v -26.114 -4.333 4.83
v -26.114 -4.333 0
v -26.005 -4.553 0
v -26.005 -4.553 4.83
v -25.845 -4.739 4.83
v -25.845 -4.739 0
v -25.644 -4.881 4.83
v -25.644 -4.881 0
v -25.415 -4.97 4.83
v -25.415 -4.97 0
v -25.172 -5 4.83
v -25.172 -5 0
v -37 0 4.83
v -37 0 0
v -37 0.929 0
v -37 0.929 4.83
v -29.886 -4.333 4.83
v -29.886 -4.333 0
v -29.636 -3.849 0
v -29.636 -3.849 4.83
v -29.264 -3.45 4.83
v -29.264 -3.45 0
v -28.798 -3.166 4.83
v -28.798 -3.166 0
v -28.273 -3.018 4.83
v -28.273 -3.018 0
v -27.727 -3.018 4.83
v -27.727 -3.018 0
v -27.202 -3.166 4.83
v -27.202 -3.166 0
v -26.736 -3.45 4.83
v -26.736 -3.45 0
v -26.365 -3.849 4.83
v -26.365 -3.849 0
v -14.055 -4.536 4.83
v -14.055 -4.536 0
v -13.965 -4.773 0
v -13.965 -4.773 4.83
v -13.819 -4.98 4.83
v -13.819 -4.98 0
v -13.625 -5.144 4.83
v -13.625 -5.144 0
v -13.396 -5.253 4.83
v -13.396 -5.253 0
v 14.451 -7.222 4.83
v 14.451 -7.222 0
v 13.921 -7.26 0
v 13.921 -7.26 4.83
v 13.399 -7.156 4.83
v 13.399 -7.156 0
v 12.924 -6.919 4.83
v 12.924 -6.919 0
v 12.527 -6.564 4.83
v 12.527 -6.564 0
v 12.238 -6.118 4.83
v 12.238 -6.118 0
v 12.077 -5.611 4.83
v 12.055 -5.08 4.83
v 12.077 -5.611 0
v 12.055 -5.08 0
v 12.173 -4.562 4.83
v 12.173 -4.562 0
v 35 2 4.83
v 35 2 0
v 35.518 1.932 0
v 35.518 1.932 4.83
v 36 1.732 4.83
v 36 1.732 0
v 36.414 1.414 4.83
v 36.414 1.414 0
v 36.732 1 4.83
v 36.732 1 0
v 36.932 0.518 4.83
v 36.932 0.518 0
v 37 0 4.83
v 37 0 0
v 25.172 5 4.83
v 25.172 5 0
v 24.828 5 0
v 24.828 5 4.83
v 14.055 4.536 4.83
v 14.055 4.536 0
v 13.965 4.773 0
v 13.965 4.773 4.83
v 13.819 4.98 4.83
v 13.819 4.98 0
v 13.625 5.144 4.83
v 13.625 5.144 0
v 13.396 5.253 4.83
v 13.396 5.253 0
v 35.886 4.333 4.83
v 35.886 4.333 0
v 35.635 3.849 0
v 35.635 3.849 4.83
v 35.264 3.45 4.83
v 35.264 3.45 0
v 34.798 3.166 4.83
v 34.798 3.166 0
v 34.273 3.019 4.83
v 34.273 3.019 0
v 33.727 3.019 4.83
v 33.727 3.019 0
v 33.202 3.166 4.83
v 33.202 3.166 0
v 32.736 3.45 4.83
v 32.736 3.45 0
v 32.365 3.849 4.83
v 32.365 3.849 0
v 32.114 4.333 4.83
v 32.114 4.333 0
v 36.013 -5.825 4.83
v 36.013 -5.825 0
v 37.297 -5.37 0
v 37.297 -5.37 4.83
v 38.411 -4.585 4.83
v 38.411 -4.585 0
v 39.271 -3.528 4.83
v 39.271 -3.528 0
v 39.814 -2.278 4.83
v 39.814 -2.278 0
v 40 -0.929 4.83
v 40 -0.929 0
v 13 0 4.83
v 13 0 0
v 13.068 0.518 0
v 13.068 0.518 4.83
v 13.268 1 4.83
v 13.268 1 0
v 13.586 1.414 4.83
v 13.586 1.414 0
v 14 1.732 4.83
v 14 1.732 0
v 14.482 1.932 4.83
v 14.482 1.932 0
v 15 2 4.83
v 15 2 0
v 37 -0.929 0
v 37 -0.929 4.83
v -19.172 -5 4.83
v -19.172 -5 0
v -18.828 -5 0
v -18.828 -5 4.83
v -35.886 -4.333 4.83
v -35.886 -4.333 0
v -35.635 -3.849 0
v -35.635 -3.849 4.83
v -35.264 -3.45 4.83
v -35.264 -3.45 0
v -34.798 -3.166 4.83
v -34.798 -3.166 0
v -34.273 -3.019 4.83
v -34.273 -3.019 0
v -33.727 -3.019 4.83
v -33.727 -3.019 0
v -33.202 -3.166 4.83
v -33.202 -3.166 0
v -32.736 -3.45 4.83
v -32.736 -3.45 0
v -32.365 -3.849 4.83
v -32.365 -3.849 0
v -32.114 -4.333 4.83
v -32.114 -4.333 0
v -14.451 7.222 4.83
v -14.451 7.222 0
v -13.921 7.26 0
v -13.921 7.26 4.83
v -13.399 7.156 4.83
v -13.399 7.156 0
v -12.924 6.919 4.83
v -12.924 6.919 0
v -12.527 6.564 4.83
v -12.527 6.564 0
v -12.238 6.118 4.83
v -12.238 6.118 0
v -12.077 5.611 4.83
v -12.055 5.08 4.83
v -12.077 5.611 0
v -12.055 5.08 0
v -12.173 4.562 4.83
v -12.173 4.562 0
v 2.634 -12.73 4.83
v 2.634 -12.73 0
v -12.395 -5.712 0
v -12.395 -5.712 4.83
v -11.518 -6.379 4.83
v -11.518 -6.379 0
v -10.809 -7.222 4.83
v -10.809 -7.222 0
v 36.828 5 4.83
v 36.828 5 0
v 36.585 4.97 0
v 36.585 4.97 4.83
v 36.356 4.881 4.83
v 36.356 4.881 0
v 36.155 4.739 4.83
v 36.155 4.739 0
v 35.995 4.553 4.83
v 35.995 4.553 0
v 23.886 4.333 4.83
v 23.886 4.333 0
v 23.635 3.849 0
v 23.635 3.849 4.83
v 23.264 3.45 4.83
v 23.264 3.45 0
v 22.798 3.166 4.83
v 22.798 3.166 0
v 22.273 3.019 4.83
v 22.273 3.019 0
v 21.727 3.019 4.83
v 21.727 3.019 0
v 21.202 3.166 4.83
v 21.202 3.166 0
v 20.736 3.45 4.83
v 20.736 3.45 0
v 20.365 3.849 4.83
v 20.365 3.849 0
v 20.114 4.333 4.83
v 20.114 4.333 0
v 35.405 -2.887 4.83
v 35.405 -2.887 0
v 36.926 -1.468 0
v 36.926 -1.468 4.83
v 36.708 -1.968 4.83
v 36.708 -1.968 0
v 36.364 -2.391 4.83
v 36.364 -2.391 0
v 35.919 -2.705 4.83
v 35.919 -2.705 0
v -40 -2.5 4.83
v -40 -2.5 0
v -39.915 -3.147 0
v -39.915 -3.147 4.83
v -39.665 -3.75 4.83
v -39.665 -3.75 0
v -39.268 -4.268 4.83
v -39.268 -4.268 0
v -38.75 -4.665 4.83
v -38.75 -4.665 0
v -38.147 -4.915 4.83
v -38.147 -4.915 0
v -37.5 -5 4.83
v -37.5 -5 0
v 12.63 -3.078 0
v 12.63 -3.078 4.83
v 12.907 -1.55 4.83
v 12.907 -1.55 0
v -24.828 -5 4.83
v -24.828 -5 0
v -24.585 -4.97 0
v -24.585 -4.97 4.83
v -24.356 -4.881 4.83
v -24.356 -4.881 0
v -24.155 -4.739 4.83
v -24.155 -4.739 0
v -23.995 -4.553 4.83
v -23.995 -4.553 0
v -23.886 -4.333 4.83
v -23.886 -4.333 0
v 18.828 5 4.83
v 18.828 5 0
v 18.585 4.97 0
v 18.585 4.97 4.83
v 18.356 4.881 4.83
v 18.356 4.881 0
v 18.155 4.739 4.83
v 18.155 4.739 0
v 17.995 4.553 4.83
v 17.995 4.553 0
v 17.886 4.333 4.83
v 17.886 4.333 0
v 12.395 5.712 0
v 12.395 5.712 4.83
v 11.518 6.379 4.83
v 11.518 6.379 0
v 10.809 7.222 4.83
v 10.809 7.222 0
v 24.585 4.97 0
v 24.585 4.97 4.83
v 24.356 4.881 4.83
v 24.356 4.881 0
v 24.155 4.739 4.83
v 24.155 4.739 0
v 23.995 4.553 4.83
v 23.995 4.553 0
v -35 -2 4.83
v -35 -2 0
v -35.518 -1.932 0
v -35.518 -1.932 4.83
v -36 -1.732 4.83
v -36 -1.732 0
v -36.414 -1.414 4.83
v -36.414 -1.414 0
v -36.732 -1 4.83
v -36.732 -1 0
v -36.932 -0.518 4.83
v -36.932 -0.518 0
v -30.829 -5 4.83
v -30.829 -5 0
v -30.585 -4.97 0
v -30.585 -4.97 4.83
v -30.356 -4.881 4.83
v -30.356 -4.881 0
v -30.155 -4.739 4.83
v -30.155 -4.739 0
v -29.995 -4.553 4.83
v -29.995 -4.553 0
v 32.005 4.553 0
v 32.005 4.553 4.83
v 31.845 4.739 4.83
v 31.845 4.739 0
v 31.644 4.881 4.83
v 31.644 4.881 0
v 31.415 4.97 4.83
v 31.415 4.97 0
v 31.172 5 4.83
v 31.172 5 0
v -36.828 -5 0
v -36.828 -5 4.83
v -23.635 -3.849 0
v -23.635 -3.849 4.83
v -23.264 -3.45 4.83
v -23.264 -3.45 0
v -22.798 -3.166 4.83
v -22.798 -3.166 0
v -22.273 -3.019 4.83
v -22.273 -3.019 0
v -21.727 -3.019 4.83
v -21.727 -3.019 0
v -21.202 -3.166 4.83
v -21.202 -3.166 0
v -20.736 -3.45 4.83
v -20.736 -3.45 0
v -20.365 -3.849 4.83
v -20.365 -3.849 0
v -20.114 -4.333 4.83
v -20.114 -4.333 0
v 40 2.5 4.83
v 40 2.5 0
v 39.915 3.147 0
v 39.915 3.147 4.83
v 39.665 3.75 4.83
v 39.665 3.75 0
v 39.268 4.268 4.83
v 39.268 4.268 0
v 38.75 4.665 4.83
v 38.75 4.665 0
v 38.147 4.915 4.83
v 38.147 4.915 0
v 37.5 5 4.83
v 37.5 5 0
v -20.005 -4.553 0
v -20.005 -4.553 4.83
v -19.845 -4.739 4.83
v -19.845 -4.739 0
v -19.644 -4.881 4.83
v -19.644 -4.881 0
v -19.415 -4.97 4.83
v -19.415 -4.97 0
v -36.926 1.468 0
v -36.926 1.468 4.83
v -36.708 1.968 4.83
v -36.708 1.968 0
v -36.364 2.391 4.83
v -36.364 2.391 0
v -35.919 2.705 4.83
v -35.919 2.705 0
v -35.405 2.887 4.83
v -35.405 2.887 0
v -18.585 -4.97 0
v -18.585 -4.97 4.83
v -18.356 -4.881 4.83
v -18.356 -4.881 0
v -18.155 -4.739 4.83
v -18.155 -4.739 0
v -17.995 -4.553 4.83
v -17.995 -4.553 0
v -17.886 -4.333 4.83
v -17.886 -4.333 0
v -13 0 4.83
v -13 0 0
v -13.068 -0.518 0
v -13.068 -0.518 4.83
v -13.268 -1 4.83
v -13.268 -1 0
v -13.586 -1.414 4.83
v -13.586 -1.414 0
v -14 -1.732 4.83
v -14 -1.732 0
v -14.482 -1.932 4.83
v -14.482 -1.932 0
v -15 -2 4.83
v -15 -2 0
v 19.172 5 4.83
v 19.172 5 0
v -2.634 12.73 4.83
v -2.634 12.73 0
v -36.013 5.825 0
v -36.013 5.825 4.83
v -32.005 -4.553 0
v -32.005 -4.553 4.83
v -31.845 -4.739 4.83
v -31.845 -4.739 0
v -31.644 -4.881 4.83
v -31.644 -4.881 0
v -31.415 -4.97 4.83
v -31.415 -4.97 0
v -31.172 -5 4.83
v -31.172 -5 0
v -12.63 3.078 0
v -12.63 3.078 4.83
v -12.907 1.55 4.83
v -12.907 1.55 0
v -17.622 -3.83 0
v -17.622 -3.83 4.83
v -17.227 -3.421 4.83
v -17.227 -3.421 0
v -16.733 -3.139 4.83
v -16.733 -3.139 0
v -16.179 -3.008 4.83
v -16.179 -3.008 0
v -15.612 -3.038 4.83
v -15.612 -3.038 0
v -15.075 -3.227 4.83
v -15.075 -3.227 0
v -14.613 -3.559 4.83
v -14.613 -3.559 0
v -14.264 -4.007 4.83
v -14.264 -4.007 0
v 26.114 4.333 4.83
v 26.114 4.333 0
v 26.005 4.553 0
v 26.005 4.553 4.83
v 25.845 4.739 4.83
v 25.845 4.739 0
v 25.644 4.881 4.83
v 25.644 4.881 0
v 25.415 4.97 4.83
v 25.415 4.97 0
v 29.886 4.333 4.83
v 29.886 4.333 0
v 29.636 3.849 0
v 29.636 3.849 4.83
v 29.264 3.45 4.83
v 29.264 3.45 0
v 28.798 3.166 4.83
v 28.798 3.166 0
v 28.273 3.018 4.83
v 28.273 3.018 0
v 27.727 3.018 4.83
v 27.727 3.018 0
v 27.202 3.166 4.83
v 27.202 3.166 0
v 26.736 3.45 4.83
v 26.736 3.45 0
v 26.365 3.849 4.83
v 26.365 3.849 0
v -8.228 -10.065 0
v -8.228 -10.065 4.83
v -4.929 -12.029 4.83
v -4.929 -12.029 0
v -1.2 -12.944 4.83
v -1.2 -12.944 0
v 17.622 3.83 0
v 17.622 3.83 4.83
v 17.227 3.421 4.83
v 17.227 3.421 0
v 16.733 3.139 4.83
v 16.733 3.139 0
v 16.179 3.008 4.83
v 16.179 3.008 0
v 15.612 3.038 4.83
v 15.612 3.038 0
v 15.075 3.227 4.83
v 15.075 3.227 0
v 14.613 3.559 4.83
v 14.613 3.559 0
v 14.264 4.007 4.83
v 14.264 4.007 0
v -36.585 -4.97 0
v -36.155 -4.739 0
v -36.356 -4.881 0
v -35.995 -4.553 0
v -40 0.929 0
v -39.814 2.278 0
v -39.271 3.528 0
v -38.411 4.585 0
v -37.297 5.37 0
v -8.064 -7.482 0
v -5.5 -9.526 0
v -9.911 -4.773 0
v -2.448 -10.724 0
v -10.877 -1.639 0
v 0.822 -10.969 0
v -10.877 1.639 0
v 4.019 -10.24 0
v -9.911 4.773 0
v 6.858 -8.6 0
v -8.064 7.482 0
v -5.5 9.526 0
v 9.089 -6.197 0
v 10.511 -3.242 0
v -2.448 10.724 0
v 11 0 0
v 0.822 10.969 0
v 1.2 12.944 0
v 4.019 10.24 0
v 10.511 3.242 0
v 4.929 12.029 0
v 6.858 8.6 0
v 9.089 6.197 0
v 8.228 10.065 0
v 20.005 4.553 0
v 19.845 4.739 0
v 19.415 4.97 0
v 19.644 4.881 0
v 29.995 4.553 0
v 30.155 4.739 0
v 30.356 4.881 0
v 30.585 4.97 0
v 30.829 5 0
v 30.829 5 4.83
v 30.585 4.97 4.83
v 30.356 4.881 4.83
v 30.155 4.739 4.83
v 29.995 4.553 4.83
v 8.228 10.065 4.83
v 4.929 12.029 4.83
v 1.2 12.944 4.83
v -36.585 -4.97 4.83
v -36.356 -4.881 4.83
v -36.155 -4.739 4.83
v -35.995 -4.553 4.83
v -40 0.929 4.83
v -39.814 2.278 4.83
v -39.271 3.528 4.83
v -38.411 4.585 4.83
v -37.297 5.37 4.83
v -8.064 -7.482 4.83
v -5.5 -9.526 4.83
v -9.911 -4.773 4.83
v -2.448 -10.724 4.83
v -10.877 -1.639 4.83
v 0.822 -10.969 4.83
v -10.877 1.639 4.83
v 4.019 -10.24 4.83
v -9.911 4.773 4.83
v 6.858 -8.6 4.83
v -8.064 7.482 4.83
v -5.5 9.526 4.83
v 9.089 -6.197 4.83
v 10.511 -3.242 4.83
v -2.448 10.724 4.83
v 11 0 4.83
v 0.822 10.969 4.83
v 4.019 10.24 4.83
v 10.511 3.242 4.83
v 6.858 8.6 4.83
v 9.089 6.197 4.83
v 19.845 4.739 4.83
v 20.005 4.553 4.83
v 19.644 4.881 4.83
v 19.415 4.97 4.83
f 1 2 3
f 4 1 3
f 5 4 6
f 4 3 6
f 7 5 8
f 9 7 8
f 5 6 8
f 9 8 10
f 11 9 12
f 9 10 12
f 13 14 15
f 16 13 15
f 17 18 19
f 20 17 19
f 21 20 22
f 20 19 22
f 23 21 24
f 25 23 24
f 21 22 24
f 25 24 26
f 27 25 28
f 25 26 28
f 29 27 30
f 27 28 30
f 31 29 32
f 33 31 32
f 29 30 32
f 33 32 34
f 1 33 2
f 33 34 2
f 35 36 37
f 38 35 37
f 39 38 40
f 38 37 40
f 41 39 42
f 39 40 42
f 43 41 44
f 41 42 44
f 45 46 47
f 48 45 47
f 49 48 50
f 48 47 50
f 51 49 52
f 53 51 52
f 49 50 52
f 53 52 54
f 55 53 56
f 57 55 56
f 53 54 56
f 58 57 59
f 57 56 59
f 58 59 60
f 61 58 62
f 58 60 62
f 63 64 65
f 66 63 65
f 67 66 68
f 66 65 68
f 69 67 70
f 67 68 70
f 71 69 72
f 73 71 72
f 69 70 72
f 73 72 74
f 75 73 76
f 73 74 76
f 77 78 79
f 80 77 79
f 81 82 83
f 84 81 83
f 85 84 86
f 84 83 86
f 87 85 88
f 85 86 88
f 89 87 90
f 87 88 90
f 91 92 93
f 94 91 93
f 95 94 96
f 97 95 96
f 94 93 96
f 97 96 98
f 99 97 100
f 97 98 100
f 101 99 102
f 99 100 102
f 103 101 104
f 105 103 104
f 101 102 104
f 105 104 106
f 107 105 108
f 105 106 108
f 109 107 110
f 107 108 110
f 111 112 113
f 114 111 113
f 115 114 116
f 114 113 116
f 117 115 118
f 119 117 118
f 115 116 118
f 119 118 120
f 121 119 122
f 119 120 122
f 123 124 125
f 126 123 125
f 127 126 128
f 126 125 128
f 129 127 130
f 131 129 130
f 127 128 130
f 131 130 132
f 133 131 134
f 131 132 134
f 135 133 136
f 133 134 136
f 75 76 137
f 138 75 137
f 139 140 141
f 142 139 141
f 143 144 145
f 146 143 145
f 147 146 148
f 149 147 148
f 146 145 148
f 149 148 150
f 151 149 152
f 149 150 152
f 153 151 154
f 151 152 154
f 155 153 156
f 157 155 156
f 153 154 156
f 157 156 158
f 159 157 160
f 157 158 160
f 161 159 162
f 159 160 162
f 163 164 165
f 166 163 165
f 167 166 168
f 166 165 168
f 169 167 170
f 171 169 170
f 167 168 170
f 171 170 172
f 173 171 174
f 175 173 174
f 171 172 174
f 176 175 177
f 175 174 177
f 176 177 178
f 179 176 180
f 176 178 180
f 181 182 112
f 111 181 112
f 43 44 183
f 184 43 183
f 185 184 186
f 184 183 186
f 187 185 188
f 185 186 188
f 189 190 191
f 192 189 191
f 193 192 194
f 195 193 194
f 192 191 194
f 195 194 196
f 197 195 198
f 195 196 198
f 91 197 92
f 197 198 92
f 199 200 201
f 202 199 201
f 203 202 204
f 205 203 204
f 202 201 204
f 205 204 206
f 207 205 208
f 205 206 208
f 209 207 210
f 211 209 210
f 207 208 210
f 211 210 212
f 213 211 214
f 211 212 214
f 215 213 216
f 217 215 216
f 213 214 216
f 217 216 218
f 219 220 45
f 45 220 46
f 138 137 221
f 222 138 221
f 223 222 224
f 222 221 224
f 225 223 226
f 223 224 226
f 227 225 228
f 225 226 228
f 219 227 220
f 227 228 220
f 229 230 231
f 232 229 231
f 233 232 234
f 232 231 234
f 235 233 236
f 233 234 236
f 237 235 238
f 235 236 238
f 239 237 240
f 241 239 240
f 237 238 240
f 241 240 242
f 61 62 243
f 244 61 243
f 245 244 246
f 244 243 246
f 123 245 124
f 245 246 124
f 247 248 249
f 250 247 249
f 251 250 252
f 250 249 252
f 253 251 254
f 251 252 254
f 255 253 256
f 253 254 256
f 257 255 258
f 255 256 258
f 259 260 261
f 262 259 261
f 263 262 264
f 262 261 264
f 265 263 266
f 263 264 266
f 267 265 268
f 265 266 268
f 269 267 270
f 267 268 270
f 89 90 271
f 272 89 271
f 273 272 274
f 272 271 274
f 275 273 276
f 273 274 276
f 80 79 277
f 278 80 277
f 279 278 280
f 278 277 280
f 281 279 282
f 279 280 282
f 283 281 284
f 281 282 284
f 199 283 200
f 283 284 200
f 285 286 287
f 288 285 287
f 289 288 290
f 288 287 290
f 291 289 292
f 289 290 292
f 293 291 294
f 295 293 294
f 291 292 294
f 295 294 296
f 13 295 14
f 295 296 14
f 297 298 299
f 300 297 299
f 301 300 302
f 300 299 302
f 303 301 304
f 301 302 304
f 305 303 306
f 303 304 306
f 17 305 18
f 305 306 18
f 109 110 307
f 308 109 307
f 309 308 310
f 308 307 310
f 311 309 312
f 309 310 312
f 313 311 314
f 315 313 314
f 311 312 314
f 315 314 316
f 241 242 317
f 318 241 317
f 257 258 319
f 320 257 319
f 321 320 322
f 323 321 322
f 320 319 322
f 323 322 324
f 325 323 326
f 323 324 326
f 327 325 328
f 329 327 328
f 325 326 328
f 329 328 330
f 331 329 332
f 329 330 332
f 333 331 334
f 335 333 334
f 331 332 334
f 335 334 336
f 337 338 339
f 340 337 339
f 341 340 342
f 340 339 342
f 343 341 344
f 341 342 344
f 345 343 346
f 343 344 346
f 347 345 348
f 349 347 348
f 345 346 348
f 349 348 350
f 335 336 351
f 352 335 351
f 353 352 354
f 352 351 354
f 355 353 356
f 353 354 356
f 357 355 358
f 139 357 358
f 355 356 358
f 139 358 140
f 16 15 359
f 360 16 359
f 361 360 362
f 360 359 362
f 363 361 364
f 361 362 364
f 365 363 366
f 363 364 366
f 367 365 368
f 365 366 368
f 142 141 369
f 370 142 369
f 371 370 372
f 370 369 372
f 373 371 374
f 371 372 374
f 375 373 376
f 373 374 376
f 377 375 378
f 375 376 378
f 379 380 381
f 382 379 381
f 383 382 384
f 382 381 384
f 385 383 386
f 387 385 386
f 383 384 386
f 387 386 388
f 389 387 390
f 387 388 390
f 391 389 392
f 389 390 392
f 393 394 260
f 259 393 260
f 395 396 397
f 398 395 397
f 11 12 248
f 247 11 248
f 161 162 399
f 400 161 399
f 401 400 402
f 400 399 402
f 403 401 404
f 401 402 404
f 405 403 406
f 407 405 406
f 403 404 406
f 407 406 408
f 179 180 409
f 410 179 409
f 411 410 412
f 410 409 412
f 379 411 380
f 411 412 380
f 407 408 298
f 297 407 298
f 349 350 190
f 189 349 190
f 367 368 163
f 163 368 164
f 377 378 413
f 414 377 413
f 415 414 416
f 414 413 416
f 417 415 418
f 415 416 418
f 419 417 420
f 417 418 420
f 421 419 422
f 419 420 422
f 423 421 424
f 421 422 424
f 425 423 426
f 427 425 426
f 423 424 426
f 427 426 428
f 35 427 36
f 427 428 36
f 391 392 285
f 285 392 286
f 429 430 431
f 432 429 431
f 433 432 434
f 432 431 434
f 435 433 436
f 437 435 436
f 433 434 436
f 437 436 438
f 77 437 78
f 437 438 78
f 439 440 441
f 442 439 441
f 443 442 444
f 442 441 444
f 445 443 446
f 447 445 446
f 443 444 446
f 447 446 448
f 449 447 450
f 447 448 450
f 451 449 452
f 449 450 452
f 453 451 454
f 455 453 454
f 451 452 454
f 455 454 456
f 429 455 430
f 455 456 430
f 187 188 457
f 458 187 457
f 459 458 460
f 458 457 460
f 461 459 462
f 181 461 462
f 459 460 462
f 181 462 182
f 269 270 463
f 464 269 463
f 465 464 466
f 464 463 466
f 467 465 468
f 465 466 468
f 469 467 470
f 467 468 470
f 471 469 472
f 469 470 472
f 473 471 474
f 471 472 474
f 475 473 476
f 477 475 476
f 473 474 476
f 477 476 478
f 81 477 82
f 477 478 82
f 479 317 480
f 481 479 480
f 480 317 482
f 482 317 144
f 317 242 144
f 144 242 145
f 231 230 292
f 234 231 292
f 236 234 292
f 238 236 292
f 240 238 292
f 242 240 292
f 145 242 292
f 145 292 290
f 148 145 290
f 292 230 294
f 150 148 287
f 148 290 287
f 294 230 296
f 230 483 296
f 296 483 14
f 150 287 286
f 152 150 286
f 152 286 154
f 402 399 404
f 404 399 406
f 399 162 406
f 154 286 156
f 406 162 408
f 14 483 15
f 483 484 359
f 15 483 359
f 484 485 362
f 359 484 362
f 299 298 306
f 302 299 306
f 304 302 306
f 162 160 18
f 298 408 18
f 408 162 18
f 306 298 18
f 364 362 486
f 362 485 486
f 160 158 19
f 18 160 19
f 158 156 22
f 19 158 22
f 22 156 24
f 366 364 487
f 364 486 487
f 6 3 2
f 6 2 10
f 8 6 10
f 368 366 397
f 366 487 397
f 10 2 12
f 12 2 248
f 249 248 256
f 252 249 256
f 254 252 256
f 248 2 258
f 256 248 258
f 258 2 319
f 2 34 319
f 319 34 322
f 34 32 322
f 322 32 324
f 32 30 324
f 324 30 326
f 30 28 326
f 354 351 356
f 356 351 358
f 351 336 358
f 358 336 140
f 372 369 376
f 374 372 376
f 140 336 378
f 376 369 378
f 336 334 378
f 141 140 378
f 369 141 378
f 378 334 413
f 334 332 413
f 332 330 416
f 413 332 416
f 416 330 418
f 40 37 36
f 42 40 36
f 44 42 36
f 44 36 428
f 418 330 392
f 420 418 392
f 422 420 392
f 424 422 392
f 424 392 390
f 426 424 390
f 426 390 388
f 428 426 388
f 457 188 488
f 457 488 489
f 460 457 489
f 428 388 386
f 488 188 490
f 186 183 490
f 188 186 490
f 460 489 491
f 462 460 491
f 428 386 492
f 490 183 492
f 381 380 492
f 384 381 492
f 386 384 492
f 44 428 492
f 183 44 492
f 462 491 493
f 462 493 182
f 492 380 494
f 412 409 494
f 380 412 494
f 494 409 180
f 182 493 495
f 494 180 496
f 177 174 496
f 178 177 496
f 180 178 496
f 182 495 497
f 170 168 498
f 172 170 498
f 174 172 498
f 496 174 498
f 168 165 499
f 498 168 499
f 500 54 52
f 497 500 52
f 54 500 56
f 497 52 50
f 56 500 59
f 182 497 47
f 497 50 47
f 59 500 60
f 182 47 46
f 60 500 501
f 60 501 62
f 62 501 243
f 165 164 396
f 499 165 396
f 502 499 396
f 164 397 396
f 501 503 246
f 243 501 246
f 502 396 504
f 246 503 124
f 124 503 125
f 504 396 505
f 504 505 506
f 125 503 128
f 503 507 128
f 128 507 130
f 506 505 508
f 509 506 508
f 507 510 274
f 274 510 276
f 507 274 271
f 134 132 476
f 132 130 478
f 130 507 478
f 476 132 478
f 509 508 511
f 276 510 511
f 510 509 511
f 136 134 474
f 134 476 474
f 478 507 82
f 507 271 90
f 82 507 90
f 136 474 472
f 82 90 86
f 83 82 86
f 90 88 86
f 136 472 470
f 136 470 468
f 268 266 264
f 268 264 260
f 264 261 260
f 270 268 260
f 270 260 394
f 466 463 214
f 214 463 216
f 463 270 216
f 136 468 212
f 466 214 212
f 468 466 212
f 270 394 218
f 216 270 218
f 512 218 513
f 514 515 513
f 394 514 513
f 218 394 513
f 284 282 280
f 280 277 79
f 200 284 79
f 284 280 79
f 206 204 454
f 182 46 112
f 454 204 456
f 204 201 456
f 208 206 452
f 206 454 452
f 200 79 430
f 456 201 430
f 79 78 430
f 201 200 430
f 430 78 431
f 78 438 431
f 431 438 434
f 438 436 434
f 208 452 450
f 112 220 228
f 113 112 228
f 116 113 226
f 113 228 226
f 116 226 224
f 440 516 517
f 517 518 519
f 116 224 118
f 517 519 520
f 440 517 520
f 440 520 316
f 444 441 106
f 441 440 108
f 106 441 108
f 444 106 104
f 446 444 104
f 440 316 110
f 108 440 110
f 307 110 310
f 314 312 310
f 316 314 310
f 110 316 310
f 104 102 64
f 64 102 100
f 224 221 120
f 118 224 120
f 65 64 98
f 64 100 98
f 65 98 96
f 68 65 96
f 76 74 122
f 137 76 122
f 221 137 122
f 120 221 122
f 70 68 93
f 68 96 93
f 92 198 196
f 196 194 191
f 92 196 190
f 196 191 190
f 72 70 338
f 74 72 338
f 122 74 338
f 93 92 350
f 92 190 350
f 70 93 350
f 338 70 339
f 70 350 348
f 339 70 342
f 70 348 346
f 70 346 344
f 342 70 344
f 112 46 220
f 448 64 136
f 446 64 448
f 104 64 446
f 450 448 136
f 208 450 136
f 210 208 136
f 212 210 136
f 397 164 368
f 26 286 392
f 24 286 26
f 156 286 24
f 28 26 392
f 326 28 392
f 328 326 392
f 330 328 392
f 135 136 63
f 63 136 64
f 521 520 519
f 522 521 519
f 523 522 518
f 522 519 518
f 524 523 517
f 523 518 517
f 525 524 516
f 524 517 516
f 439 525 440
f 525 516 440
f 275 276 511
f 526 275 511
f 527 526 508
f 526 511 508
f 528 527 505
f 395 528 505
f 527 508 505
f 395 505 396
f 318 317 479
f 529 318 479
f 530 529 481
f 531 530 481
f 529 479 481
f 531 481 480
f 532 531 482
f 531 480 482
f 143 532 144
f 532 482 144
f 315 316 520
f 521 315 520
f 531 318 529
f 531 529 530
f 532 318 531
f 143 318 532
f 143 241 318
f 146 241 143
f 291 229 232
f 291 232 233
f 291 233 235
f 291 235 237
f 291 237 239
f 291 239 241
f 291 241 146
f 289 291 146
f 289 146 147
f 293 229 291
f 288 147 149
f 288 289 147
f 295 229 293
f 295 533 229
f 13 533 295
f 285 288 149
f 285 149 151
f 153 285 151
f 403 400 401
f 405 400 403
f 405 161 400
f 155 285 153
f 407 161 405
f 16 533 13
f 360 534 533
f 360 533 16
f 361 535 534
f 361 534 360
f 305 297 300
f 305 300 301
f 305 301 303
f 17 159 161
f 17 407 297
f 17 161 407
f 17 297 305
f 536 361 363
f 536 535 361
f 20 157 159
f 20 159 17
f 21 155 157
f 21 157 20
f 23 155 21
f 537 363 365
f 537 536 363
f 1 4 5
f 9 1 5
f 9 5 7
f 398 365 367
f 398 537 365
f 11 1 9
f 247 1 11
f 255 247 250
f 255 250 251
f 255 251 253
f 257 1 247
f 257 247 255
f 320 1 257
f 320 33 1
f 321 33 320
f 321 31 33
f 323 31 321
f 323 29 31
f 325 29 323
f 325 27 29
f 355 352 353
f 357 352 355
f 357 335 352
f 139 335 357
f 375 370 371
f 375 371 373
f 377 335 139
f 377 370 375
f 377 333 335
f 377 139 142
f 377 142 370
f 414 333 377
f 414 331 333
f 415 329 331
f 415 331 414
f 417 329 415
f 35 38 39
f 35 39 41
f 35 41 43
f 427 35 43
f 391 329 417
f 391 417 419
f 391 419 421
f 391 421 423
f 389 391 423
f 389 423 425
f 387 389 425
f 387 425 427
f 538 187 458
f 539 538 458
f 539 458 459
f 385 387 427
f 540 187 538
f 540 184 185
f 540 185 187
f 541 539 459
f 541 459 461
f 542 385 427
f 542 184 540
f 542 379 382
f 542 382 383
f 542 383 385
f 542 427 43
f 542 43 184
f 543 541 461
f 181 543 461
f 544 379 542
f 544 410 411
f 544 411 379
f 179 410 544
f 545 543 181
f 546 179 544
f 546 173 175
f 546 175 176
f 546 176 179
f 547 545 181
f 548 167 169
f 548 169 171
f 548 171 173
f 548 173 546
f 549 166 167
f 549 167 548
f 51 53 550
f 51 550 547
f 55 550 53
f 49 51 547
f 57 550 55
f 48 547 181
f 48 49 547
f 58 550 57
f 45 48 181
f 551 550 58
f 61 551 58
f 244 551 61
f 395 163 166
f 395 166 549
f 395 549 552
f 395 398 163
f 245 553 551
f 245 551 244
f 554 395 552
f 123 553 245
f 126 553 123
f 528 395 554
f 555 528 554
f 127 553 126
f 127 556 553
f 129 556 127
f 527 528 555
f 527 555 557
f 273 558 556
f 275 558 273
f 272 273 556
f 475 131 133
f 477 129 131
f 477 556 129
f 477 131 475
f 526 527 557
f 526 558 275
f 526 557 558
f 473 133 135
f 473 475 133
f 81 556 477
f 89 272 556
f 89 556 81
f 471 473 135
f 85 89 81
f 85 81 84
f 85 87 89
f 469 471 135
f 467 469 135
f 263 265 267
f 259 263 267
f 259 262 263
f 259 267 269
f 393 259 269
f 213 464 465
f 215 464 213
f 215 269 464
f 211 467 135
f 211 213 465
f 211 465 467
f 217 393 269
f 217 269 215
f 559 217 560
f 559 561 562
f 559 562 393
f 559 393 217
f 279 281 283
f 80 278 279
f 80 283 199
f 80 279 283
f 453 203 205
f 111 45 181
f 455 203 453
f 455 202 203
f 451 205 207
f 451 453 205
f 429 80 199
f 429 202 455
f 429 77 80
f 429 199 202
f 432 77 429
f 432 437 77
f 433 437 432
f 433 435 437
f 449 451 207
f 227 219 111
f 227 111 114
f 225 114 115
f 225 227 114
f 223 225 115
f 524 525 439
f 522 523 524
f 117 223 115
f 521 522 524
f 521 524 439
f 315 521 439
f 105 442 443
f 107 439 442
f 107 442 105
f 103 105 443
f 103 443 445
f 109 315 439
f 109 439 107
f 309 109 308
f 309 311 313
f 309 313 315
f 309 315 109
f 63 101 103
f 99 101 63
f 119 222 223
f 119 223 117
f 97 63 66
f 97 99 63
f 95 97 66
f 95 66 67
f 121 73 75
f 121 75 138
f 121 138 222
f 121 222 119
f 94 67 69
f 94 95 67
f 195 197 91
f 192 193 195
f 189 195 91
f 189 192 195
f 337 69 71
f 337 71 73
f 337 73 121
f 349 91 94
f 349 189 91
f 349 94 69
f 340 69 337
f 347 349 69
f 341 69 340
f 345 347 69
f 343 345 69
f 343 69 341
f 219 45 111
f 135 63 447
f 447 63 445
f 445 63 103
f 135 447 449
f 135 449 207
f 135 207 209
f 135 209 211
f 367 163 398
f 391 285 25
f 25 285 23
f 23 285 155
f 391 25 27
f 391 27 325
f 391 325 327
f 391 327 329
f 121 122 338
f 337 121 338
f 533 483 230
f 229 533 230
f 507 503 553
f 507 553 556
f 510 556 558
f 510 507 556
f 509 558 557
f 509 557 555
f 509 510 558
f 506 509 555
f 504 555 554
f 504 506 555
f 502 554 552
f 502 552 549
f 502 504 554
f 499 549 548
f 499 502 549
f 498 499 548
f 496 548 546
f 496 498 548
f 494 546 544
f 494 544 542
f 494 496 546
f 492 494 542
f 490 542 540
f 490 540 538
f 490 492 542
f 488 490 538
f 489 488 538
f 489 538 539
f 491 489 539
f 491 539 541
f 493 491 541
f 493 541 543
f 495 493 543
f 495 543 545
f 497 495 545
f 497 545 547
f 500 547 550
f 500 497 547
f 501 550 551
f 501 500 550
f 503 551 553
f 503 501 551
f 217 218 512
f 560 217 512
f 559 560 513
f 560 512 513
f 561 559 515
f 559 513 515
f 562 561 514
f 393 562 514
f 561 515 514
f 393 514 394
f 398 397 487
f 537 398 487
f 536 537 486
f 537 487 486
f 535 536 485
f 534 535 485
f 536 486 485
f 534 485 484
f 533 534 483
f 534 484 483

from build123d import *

# Parameters (mm, degrees)
F0_R     = 11
F1_DEPTH = 4.83


with BuildPart() as f1:
    # F0 (on Top) → F1 (new body)
    with BuildSketch(Plane.XY):
        with BuildLine():
            ThreePointArc((-36.01296, 5.824847), (-38.877164, 4.085682), (-40, 0.928531))
            Line((-40, 0.928531), (-40, -2.5))
            ThreePointArc((-40, -2.5), (-39.267767, -4.267767), (-37.5, -5))
            Line((-37.5, -5), (-36.828427, -5))
            ThreePointArc((-36.828427, -5), (-36.251077, -4.816497), (-35.885618, -4.333333))
            ThreePointArc((-35.885618, -4.333333), (-34, -3), (-32.114382, -4.333333))
            ThreePointArc((-32.114382, -4.333333), (-31.748923, -4.816497), (-31.171573, -5))
            Line((-31.171573, -5), (-30.828573, -5))
            ThreePointArc((-30.828573, -5), (-30.251193, -4.816476), (-29.88574, -4.333265))
            ThreePointArc((-29.88574, -4.333265), (-28.000073, -2.999794), (-26.114406, -4.333265))
            ThreePointArc((-26.114406, -4.333265), (-25.748953, -4.816476), (-25.171573, -5))
            Line((-25.171573, -5), (-24.828427, -5))
            ThreePointArc((-24.828427, -5), (-24.251077, -4.816497), (-23.885618, -4.333333))
            ThreePointArc((-23.885618, -4.333333), (-22, -3), (-20.114382, -4.333333))
            ThreePointArc((-20.114382, -4.333333), (-19.748923, -4.816497), (-19.171573, -5))
            Line((-19.171573, -5), (-18.828427, -5))
            ThreePointArc((-18.828427, -5), (-18.251077, -4.816497), (-17.885618, -4.333333))
            ThreePointArc((-17.885618, -4.333333), (-15.89445, -3.002787), (-14.054617, -4.535797))
            ThreePointArc((-14.054617, -4.535797), (-13.818534, -4.980014), (-13.396043, -5.253079))
            ThreePointArc((-13.396043, -5.253079), (-11.938126, -6.021537), (-10.809232, -7.222222))
            ThreePointArc((-10.809232, -7.222222), (-4.928987, -12.029343), (2.633697, -12.730422))
            Line((2.633697, -12.730422), (36.01296, -5.824847))
            ThreePointArc((36.01296, -5.824847), (38.877164, -4.085682), (40, -0.928531))
            Line((40, -0.928531), (40, 2.5))
            ThreePointArc((40, 2.5), (39.267767, 4.267767), (37.5, 5))
            Line((37.5, 5), (36.828427, 5))
            ThreePointArc((36.828427, 5), (36.251077, 4.816497), (35.885618, 4.333333))
            ThreePointArc((35.885618, 4.333333), (34, 3), (32.114382, 4.333333))
            ThreePointArc((32.114382, 4.333333), (31.748923, 4.816497), (31.171573, 5))
            Line((31.171573, 5), (30.828573, 5))
            ThreePointArc((30.828573, 5), (30.251193, 4.816476), (29.88574, 4.333265))
            ThreePointArc((29.88574, 4.333265), (28.000073, 2.999794), (26.114406, 4.333265))
            ThreePointArc((26.114406, 4.333265), (25.748953, 4.816476), (25.171573, 5))
            Line((25.171573, 5), (24.828427, 5))
            ThreePointArc((24.828427, 5), (24.251077, 4.816497), (23.885618, 4.333333))
            ThreePointArc((23.885618, 4.333333), (22, 3), (20.114382, 4.333333))
            ThreePointArc((20.114382, 4.333333), (19.748923, 4.816497), (19.171573, 5))
            Line((19.171573, 5), (18.828427, 5))
            ThreePointArc((18.828427, 5), (18.251077, 4.816497), (17.885618, 4.333333))
            ThreePointArc((17.885618, 4.333333), (15.89445, 3.002787), (14.054617, 4.535797))
            ThreePointArc((14.054617, 4.535797), (13.818534, 4.980014), (13.396043, 5.253079))
            ThreePointArc((13.396043, 5.253079), (11.938126, 6.021537), (10.809232, 7.222222))
            ThreePointArc((10.809232, 7.222222), (4.928987, 12.029343), (-2.633697, 12.730422))
            Line((-2.633697, 12.730422), (-36.01296, 5.824847))
        make_face()
        with BuildLine():
            ThreePointArc((14.451378, -7.222027), (12.527041, -6.564336), (12.173368, -4.5617))
            ThreePointArc((12.173368, -4.5617), (12.791673, -2.317996), (13, 0))
            ThreePointArc((13, 0), (13.585786, 1.414214), (15, 2))
            Line((15, 2), (35, 2))
            ThreePointArc((35, 2), (36.414214, 1.414214), (37, 0))
            Line((37, 0), (37, -0.928531))
            ThreePointArc((37, -0.928531), (36.550866, -2.191391), (35.405184, -2.887058))
            Line((35.405184, -2.887058), (14.451378, -7.222027))
        make_face(mode=Mode.SUBTRACT)
        with BuildLine():
            ThreePointArc((-14.451378, 7.222027), (-12.527041, 6.564336), (-12.173368, 4.5617))
            ThreePointArc((-12.173368, 4.5617), (-12.791673, 2.317996), (-13, 0))
            ThreePointArc((-13, 0), (-13.585786, -1.414214), (-15, -2))
            Line((-15, -2), (-35, -2))
            ThreePointArc((-35, -2), (-36.414214, -1.414214), (-37, 0))
            Line((-37, 0), (-37, 0.928531))
            ThreePointArc((-37, 0.928531), (-36.550866, 2.191391), (-35.405184, 2.887058))
            Line((-35.405184, 2.887058), (-14.451378, 7.222027))
        make_face(mode=Mode.SUBTRACT)
        Circle(F0_R, mode=Mode.SUBTRACT)
    extrude(amount=F1_DEPTH)


solid = f1.part
